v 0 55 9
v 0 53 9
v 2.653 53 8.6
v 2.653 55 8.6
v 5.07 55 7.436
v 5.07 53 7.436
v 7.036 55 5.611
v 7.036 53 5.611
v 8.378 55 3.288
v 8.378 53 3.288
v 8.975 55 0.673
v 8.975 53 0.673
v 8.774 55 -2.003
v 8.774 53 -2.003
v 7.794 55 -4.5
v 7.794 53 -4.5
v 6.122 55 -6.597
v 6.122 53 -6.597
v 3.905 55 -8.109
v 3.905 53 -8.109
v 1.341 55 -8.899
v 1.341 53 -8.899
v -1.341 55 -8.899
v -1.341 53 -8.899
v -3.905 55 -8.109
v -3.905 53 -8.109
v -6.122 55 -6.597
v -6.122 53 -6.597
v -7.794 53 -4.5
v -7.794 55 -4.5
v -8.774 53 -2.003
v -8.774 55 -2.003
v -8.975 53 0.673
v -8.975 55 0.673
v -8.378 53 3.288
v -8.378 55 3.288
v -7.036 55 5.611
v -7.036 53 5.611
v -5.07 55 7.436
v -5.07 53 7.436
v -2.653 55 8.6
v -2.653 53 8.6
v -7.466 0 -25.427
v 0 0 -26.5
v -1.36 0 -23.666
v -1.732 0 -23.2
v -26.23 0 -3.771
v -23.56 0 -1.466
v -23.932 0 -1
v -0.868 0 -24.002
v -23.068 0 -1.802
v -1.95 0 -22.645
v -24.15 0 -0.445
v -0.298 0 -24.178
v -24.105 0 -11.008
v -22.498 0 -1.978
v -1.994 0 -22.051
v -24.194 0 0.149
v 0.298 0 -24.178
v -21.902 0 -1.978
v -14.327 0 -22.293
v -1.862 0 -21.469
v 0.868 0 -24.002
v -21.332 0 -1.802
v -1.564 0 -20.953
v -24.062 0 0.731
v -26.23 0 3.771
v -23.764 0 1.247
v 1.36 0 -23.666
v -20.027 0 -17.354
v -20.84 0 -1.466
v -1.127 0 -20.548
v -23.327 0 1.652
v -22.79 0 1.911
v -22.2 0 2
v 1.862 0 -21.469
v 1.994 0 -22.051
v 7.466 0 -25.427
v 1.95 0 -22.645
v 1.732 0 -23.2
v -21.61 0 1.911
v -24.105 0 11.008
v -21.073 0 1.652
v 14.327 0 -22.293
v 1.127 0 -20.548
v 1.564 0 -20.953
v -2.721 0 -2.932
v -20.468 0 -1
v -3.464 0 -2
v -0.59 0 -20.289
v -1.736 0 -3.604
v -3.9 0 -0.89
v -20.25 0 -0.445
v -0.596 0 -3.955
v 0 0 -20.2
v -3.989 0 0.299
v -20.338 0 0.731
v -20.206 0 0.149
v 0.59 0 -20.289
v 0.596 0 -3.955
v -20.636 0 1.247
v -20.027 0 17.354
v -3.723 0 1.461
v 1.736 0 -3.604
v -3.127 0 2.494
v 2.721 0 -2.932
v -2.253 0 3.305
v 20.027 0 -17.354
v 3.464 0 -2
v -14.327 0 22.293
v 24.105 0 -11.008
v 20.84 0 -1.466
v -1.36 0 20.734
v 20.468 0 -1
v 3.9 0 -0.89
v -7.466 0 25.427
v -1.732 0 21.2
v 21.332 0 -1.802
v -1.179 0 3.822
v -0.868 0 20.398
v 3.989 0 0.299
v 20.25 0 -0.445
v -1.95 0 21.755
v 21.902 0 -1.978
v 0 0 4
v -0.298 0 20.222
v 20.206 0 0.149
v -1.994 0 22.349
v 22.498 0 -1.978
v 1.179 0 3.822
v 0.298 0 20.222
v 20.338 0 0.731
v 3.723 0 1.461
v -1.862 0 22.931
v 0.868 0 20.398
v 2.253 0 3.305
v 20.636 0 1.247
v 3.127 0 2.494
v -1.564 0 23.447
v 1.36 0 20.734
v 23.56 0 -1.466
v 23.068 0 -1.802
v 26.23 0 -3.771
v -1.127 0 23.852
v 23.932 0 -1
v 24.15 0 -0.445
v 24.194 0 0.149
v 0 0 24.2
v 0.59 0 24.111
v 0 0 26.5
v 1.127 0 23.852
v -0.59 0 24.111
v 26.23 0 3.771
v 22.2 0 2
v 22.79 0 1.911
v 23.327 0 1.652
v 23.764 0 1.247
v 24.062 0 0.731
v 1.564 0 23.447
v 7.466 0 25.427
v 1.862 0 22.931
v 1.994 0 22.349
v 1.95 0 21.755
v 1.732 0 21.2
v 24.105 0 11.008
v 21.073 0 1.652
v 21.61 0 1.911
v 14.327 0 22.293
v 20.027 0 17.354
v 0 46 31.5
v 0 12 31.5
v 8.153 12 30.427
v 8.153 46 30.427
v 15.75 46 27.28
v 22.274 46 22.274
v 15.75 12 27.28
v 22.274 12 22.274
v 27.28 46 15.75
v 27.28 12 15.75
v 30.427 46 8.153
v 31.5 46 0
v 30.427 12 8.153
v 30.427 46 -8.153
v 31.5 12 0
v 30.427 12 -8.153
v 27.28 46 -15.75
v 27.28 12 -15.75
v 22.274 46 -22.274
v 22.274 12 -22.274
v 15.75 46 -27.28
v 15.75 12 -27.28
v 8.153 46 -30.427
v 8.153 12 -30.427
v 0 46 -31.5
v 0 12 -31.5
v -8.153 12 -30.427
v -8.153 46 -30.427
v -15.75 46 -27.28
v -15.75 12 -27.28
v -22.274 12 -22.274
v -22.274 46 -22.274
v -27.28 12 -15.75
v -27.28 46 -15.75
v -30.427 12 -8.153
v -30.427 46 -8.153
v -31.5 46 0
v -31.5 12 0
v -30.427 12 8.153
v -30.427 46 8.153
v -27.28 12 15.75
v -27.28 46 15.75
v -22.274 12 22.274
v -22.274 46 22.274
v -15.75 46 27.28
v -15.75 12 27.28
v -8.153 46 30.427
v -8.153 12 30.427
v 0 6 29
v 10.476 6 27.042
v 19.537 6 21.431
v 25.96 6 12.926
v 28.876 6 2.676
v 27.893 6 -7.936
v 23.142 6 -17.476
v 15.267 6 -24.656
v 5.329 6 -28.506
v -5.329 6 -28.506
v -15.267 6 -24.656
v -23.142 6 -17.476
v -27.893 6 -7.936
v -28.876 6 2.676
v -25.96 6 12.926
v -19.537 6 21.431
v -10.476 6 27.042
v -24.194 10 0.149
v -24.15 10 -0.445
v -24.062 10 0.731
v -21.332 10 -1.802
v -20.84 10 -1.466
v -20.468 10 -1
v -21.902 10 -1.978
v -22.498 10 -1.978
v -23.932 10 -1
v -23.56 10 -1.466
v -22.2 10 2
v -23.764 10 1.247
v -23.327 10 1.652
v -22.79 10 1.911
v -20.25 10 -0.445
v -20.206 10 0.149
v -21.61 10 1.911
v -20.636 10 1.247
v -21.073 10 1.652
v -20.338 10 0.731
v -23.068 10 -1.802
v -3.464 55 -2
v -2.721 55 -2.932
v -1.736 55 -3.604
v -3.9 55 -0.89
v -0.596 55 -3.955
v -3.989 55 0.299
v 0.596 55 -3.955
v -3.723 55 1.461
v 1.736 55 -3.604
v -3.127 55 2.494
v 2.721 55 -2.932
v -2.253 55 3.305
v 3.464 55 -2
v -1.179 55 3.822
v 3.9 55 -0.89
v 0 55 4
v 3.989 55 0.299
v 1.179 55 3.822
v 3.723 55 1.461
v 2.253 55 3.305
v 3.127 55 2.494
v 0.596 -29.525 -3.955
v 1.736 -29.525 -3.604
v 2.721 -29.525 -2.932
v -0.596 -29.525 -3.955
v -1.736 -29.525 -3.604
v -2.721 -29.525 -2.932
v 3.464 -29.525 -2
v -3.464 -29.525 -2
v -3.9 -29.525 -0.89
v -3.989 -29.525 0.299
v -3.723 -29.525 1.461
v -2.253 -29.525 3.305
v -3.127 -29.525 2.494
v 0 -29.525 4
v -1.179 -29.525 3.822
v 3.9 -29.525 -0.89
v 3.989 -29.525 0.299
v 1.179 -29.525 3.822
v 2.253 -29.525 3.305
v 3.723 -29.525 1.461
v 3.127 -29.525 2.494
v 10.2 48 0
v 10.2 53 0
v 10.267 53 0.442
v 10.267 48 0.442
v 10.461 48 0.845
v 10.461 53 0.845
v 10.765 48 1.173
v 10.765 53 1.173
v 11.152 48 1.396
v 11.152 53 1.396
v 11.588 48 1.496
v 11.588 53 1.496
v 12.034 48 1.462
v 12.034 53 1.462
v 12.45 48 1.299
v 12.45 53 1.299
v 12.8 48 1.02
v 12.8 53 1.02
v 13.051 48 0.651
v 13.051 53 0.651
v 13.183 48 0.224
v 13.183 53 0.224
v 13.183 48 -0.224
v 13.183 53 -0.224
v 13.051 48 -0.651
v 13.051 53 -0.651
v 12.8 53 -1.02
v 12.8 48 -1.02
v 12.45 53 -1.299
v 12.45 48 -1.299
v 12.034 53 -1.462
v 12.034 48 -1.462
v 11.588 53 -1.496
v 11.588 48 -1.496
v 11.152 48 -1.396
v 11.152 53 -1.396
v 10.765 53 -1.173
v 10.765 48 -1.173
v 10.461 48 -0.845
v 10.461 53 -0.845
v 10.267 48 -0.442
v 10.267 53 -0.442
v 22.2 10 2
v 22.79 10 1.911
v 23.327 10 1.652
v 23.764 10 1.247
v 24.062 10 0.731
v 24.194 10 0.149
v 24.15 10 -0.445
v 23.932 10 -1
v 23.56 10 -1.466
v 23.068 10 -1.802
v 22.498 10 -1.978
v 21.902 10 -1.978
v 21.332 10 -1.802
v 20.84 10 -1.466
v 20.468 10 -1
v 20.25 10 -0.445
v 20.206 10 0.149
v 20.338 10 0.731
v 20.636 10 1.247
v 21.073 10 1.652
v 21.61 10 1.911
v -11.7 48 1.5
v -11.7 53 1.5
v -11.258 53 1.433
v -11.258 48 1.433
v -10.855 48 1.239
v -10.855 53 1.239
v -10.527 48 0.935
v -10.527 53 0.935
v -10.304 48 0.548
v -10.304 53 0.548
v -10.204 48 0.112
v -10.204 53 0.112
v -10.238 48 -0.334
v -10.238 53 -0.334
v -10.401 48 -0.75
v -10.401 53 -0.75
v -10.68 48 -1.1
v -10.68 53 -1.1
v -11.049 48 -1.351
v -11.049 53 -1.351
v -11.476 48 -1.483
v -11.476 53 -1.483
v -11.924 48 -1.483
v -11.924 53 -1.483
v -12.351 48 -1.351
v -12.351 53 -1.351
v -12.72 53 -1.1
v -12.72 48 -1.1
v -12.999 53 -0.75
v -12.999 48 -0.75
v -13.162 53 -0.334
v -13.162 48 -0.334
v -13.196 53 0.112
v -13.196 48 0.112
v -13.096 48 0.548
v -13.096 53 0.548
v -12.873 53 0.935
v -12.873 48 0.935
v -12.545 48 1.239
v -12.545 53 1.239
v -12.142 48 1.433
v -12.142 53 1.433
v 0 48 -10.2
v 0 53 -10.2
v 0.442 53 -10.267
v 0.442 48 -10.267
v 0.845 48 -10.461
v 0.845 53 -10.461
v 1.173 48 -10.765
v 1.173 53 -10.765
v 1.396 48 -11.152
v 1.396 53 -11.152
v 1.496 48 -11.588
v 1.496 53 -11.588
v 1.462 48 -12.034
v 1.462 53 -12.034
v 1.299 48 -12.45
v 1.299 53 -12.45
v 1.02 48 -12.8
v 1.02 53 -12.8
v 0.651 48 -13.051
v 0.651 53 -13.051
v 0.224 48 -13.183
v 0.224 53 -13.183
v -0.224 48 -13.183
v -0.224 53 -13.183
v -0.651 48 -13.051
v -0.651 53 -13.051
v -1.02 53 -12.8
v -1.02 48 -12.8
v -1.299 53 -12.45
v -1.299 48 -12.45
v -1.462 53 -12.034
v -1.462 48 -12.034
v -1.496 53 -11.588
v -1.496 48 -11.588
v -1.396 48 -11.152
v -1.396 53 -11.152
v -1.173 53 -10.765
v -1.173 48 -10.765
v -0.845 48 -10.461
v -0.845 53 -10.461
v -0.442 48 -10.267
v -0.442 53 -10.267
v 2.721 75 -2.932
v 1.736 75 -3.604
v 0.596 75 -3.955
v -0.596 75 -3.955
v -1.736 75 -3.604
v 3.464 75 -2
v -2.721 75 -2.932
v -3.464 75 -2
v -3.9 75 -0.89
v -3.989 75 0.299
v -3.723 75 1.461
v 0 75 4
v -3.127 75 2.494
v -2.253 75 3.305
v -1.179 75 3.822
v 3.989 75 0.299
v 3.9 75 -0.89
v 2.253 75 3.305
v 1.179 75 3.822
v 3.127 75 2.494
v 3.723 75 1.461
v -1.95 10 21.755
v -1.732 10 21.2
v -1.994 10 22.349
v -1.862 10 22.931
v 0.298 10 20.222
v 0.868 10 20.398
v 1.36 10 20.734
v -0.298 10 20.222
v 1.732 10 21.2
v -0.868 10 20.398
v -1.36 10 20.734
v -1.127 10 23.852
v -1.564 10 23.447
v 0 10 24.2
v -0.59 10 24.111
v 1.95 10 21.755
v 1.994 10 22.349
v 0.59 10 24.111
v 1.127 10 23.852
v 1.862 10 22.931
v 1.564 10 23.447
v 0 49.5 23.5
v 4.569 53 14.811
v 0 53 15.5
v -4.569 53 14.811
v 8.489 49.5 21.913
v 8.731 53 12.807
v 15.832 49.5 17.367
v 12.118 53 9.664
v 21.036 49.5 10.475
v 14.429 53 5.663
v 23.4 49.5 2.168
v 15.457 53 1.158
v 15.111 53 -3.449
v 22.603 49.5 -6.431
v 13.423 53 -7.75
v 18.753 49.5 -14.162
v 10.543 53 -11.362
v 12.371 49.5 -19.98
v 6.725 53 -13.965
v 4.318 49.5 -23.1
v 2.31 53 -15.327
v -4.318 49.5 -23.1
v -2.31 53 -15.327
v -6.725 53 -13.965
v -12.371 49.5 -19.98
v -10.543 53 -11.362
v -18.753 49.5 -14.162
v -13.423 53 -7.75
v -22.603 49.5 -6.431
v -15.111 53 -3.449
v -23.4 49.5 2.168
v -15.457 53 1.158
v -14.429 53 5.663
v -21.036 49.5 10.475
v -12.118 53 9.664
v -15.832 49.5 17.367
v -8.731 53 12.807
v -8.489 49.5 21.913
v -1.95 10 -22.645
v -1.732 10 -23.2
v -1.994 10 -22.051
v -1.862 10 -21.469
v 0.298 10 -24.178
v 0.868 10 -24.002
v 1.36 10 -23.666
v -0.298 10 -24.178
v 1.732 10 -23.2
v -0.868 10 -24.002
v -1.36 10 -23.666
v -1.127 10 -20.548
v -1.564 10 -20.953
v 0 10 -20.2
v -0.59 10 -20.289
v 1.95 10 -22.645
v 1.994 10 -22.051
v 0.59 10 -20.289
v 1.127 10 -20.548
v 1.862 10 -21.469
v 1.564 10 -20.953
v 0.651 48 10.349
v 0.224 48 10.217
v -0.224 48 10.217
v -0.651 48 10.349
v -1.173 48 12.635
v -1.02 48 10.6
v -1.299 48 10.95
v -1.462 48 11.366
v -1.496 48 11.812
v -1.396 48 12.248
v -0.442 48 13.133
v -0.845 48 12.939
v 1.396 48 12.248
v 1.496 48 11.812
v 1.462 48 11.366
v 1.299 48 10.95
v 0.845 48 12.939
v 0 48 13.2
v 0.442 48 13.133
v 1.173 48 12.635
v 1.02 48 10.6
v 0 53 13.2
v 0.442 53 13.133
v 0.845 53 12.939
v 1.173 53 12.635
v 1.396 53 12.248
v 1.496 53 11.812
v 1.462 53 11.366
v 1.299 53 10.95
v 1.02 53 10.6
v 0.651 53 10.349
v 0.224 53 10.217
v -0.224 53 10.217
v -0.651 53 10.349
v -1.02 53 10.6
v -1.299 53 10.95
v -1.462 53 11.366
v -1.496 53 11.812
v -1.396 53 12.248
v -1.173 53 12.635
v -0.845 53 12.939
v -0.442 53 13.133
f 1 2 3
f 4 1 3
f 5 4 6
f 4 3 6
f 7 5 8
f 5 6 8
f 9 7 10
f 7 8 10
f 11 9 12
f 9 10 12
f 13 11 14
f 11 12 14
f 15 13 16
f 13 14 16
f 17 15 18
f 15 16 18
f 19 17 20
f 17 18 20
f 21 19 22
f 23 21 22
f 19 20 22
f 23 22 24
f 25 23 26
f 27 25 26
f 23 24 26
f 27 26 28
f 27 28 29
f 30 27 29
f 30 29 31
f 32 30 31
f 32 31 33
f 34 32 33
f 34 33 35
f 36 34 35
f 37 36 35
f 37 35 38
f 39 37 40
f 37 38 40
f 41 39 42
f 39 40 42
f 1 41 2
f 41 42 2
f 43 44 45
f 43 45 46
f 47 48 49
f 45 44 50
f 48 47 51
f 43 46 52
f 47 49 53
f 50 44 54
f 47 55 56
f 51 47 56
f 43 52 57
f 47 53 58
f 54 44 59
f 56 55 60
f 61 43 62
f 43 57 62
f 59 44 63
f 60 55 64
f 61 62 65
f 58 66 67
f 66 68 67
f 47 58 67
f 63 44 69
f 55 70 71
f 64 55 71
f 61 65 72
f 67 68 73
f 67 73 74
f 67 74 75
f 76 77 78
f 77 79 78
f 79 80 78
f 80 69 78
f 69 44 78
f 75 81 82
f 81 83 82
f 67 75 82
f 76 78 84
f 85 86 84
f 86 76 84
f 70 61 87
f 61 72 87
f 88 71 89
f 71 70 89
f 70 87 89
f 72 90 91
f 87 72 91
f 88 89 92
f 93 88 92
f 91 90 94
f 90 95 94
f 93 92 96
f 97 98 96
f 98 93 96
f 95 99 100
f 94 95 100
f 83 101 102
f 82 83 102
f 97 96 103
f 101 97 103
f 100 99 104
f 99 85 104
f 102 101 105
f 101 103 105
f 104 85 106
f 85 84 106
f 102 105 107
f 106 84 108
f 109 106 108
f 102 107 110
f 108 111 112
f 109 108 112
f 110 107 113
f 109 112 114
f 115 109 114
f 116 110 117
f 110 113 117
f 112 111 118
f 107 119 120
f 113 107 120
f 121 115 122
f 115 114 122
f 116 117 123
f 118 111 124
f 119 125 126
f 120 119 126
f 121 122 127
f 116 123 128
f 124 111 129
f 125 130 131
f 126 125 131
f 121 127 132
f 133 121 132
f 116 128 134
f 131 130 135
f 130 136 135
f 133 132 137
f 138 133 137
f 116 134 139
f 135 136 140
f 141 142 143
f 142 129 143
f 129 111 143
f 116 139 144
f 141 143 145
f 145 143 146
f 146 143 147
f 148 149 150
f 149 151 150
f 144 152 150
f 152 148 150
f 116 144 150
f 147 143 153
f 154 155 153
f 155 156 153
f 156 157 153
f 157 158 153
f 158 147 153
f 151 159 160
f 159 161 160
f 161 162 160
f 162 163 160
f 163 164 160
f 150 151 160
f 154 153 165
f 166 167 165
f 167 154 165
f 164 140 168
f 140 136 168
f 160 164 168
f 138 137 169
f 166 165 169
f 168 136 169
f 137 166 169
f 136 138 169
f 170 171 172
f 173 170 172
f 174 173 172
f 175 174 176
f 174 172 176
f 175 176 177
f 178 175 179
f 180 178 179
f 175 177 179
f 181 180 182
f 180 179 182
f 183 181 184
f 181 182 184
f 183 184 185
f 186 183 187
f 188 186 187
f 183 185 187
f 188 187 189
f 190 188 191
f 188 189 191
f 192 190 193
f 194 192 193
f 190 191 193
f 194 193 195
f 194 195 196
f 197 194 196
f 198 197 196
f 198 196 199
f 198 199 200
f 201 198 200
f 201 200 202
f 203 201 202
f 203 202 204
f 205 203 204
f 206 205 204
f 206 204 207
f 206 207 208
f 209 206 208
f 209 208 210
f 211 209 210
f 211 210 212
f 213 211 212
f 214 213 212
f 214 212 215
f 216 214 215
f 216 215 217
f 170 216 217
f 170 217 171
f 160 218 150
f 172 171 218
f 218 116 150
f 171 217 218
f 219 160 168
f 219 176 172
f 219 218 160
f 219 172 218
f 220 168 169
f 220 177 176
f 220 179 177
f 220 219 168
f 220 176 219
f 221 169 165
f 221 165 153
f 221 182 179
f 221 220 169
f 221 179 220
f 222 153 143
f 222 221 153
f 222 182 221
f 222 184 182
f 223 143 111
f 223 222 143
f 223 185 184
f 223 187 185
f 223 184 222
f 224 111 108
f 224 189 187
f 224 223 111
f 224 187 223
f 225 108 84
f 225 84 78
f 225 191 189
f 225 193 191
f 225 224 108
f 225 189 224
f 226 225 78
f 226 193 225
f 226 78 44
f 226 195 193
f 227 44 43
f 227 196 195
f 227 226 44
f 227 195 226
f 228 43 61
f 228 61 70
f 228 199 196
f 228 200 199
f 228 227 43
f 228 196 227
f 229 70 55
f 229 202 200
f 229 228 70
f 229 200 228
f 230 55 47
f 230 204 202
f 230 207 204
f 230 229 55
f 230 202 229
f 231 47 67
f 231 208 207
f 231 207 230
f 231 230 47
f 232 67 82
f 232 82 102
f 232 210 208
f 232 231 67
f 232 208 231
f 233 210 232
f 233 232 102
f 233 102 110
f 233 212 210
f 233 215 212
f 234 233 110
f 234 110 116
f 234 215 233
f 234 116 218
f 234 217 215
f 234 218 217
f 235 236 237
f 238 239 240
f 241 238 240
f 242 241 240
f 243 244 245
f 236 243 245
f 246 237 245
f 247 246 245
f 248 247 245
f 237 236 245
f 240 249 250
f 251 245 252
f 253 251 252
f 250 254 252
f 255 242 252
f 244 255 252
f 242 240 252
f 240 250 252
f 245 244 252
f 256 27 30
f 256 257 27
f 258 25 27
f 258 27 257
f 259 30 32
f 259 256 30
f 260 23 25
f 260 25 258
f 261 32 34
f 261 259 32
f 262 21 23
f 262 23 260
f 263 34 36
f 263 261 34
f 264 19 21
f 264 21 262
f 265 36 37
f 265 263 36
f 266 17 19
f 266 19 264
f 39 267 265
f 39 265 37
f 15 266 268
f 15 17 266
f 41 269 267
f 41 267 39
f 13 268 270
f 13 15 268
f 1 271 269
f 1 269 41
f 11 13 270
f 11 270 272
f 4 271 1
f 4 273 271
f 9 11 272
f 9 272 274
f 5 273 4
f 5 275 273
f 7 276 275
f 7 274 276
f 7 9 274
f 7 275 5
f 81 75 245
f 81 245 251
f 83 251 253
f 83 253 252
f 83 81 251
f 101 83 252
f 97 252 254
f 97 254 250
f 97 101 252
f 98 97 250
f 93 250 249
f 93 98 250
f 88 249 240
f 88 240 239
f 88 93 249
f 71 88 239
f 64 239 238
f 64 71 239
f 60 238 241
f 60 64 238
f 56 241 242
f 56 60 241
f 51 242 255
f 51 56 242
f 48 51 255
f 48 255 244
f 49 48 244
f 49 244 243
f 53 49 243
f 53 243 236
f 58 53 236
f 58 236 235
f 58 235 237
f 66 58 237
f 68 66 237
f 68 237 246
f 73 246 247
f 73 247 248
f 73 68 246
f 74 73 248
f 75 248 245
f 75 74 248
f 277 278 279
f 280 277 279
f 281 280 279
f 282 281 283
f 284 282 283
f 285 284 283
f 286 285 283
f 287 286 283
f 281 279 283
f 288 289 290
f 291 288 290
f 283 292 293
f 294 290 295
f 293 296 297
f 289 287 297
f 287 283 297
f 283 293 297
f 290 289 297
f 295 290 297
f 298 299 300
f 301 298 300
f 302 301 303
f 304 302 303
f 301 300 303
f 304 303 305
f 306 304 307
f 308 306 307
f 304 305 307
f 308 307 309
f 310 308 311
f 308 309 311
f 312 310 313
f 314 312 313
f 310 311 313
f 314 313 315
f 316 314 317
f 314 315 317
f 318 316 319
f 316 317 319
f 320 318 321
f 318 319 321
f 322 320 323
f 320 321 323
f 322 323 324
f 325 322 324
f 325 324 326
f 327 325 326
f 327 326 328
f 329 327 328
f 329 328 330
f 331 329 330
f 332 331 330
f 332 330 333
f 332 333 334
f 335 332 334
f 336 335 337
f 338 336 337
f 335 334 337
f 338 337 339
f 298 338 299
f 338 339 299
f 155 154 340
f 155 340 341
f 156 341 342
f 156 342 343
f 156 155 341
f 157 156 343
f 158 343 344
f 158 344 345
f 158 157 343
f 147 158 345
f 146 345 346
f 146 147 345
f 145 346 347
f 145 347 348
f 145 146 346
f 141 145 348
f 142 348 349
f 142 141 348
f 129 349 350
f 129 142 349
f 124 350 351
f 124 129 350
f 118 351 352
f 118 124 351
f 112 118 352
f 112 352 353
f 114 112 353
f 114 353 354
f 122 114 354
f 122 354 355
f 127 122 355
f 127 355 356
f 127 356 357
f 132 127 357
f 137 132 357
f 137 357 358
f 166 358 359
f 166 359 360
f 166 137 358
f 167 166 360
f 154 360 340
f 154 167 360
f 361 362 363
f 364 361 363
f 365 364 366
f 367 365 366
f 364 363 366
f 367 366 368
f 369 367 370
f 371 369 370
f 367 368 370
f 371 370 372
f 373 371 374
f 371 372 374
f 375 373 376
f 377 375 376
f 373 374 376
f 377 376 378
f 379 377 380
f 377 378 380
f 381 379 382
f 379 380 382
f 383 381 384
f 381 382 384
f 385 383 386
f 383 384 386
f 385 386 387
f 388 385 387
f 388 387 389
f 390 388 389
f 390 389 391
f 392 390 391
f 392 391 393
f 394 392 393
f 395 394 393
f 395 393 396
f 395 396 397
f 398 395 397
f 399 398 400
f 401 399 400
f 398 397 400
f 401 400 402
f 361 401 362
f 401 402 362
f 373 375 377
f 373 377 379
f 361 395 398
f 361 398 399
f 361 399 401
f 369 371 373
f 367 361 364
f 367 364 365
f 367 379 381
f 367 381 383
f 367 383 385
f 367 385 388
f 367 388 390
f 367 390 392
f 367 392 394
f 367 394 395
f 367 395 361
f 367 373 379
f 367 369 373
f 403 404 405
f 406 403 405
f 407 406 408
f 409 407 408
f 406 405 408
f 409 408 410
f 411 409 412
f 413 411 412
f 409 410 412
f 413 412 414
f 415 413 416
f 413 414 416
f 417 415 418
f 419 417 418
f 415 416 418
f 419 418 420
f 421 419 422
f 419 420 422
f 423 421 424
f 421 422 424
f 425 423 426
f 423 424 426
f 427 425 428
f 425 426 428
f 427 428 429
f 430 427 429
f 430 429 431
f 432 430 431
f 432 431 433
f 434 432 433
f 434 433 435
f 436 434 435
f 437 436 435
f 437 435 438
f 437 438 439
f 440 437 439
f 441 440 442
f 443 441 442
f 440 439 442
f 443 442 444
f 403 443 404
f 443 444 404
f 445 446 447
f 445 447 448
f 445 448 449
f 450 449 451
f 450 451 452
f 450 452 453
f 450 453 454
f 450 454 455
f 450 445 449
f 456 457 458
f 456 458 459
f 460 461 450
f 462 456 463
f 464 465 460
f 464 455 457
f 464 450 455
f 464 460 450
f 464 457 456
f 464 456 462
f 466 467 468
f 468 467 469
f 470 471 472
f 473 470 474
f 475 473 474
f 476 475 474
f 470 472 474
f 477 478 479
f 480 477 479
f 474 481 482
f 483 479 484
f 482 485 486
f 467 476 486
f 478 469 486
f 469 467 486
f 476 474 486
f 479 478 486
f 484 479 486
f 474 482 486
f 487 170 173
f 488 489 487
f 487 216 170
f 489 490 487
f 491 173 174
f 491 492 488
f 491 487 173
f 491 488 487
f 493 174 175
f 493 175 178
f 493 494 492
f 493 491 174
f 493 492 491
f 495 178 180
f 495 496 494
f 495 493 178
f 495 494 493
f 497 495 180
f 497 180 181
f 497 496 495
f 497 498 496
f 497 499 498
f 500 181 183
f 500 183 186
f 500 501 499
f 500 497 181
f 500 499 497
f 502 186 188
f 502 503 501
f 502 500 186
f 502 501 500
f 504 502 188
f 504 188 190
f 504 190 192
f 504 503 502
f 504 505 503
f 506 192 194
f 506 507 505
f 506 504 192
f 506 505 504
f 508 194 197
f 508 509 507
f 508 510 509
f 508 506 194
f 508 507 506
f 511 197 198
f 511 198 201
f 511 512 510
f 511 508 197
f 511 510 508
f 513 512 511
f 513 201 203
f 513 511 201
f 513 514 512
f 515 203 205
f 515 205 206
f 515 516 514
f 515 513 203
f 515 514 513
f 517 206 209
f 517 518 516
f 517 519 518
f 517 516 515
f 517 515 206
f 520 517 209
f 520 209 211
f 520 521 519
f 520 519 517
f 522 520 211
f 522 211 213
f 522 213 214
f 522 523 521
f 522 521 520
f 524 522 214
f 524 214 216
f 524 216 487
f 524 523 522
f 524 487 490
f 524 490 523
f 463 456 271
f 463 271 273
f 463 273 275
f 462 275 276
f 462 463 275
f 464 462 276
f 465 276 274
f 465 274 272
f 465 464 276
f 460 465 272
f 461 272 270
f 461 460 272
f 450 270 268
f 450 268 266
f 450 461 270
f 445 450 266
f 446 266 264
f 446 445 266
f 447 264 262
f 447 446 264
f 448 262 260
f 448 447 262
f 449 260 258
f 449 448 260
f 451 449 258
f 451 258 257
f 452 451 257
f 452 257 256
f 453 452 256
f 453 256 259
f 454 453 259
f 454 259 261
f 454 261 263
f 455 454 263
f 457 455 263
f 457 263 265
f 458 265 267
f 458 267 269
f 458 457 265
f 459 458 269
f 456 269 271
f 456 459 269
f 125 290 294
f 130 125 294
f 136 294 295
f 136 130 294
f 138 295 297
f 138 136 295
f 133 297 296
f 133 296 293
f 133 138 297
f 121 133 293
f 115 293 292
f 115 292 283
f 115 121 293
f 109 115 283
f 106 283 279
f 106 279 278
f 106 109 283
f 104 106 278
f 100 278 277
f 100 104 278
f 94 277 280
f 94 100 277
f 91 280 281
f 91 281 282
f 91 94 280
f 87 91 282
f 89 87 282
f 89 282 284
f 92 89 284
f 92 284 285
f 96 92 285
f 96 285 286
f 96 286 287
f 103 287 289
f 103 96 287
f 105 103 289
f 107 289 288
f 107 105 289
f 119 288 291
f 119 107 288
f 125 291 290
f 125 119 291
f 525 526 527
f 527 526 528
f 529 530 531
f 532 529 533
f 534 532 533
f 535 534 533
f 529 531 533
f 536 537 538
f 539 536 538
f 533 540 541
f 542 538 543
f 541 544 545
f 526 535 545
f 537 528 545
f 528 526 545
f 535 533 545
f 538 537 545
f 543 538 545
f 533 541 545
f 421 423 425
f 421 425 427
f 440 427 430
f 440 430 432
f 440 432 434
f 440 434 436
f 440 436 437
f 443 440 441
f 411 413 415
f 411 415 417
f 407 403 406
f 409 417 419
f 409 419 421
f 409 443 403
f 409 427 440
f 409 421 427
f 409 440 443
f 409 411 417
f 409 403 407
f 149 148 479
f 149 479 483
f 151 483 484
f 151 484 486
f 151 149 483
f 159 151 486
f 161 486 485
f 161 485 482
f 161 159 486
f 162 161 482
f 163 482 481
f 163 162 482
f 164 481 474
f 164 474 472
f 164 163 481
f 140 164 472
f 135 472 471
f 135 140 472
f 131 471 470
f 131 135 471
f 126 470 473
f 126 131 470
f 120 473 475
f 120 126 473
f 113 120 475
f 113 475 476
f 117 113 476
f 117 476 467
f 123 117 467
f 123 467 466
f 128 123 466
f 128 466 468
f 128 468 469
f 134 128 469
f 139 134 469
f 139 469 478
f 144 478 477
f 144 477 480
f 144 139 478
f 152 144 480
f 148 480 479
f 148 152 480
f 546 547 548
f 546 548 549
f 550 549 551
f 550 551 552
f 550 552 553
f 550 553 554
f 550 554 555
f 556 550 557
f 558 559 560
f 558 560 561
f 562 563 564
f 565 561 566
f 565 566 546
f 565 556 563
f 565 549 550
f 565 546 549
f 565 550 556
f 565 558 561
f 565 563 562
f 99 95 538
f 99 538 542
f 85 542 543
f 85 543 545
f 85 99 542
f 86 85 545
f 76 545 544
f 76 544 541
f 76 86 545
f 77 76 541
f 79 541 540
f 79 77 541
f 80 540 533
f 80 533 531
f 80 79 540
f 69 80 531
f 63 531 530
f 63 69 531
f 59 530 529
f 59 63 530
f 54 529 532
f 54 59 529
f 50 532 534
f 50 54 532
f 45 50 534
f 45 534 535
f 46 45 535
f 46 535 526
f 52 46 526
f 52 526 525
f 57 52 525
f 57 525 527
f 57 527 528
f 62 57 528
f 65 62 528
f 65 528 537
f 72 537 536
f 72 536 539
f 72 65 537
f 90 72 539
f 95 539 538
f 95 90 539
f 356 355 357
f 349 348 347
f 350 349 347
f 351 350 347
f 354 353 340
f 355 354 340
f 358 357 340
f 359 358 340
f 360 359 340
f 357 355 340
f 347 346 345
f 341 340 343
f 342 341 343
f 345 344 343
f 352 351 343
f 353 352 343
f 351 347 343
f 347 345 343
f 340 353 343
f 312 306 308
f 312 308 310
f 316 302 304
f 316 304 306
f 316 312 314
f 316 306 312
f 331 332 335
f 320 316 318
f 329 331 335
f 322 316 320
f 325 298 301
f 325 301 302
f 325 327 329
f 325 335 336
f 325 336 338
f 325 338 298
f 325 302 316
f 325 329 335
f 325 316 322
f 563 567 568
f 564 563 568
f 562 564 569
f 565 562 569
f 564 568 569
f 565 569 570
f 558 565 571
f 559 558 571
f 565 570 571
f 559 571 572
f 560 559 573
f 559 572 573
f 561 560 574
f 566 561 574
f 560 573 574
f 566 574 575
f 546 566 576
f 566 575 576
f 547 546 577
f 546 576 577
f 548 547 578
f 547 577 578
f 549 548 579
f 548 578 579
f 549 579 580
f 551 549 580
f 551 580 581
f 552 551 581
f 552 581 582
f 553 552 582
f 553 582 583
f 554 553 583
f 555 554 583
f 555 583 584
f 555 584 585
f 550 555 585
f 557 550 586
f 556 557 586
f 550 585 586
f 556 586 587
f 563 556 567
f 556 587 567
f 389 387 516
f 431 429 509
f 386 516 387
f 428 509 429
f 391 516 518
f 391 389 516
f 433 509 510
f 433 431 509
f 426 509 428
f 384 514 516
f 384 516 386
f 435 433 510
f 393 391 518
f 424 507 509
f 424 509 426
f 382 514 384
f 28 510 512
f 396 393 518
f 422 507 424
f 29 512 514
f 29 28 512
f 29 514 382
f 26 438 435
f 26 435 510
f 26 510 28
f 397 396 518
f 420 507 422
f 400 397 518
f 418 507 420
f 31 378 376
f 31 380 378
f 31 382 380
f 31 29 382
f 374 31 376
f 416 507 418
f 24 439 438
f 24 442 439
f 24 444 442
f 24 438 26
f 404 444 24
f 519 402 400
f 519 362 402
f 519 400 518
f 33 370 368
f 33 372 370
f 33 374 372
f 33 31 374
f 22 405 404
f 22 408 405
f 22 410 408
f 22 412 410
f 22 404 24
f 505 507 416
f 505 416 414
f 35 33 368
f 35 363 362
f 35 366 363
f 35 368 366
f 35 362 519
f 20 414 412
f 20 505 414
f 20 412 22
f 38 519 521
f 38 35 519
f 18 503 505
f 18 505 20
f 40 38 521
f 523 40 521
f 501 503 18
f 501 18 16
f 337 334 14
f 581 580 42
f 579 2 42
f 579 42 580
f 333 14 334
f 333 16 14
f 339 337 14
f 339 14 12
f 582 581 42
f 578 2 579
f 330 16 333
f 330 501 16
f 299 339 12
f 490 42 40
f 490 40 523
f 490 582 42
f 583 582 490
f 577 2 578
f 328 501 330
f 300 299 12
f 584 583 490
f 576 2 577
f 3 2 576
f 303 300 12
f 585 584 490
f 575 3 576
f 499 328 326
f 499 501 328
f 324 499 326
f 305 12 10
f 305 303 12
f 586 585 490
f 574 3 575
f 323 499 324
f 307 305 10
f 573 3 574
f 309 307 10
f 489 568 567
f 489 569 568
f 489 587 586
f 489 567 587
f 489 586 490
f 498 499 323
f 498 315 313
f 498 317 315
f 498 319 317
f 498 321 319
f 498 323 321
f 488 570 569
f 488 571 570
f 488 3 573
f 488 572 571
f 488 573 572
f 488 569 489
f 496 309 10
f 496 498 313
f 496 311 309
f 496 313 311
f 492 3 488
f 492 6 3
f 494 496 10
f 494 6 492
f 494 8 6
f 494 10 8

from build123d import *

# Parameters (mm, degrees)
SKETCH1_R           = 31.5
BOSS_EXTRUDE1_DEPTH = 55
CUT_EXTRUDE1_START  = 53
SKETCH1_4_R         = 31.5
SKETCH1_4_R_2       = 9
CUT_EXTRUDE1_DEPTH  = 2
SKETCH1_5_R         = 4
BOSS_EXTRUDE2_DEPTH = 29.525
SKETCH1_7_R         = 2
CUT_EXTRUDE2_DEPTH  = 10
CUT_EXTRUDE3_START  = 53
SKETCH1_10_R        = 1.5
CUT_EXTRUDE3_DEPTH  = 5
CHAMFER1_SIZE       = 5
CHAMFER1_SIZE2      = 12
CHAMFER2_SIZE       = 7
CHAMFER2_SIZE2      = 16
BOSS_EXTRUDE4_START = 75
SKETCH1_11_R        = 4
BOSS_EXTRUDE4_DEPTH = 20


with BuildPart() as part:
    # Sketch1 → Boss-Extrude1 (new body)
    with BuildSketch(Plane(origin=(0, 0, 0), x_dir=(1, 0, 0), z_dir=(0, 1, 0))):
        with Locations(Location((0, 0, 0), (0, 0, 270))):
            Circle(SKETCH1_R)
    extrude(amount=BOSS_EXTRUDE1_DEPTH)

    # Sketch1<4> → Cut-Extrude1 (cut)
    with BuildSketch(Plane(origin=(0, 0, 0), x_dir=(1, 0, 0), z_dir=(0, 1, 0)).offset(CUT_EXTRUDE1_START)):
        with Locations(Location((0, 0, 0), (0, 0, 270))):
            Circle(SKETCH1_4_R)
        with Locations(Location((0, 0, 0), (0, 0, 270))):
            Circle(SKETCH1_4_R_2, mode=Mode.SUBTRACT)
    extrude(amount=CUT_EXTRUDE1_DEPTH, mode=Mode.SUBTRACT)

    # Sketch1<5> → Boss-Extrude2 (add)
    with BuildSketch(Plane(origin=(0, 0, 0), x_dir=(1, 0, 0), z_dir=(0, 1, 0))):
        with Locations(Location((0, 0, 0), (0, 0, 270))):
            Circle(SKETCH1_5_R)
    extrude(amount=-BOSS_EXTRUDE2_DEPTH)

    # Sketch1<7> → Cut-Extrude2 (cut)
    with BuildSketch(Plane(origin=(0, 0, 0), x_dir=(1, 0, 0), z_dir=(0, 1, 0))):
        with Locations(Location((22.2, 0, 0), (0, 0, 270))):
            Circle(SKETCH1_7_R)
        with Locations(Location((0, 22.2, 0), (0, 0, 270))):
            Circle(SKETCH1_7_R)
        with Locations(Location((-22.2, 0, 0), (0, 0, 270))):
            Circle(SKETCH1_7_R)
        with Locations(Location((0, -22.2, 0), (0, 0, 270))):
            Circle(SKETCH1_7_R)
    extrude(amount=CUT_EXTRUDE2_DEPTH, mode=Mode.SUBTRACT)

    # Sketch1<10> → Cut-Extrude3 (cut)
    with BuildSketch(Plane(origin=(0, 0, 0), x_dir=(1, 0, 0), z_dir=(0, 1, 0)).offset(CUT_EXTRUDE3_START)):
        with Locations(Location((-11.7, 0, 0), (0, 0, 270))):
            Circle(SKETCH1_10_R)
        with Locations(Location((0, 11.7, 0), (0, 0, 270))):
            Circle(SKETCH1_10_R)
        with BuildLine():
            ThreePointArc((13.2, 0), (11.7, 1.5), (10.2, 0))
            Line((10.2, 0), (13.2, 0))
        make_face()
        with BuildLine():
            Line((13.2, 0), (10.2, 0))
            ThreePointArc((10.2, 0), (11.7, -1.5), (13.2, 0))
        make_face()
        with Locations(Location((0, -11.7, 0), (0, 0, 270))):
            Circle(SKETCH1_10_R)
    extrude(amount=-CUT_EXTRUDE3_DEPTH, mode=Mode.SUBTRACT)

    # Chamfer1
    chamfer1_edges = [part.edges().sort_by_distance(p)[0] for p in [
        (0, 0, -31.5),
    ]]
    chamfer1_side = [part.faces().sort_by_distance(p)[0] for p in [
        (0, 0, -30.609045456),
    ]]
    chamfer(chamfer1_edges, length=CHAMFER1_SIZE, length2=CHAMFER1_SIZE2, reference=chamfer1_side[0])

    # Chamfer2
    chamfer2_edges = [part.edges().sort_by_distance(p)[0] for p in [
        (0, 53, -31.5),
    ]]
    chamfer2_side = [part.faces().sort_by_distance(p)[0] for p in [
        (0, 32.5, -31.5),
    ]]
    chamfer(chamfer2_edges, length=CHAMFER2_SIZE, length2=CHAMFER2_SIZE2, reference=chamfer2_side[0])

    # Sketch1<11> → Boss-Extrude4 (add)
    with BuildSketch(Plane(origin=(0, 0, 0), x_dir=(1, 0, 0), z_dir=(0, 1, 0)).offset(BOSS_EXTRUDE4_START)):
        with Locations(Location((0, 0, 0), (0, 0, 270))):
            Circle(SKETCH1_11_R)
    extrude(amount=-BOSS_EXTRUDE4_DEPTH)


solid = part.part
